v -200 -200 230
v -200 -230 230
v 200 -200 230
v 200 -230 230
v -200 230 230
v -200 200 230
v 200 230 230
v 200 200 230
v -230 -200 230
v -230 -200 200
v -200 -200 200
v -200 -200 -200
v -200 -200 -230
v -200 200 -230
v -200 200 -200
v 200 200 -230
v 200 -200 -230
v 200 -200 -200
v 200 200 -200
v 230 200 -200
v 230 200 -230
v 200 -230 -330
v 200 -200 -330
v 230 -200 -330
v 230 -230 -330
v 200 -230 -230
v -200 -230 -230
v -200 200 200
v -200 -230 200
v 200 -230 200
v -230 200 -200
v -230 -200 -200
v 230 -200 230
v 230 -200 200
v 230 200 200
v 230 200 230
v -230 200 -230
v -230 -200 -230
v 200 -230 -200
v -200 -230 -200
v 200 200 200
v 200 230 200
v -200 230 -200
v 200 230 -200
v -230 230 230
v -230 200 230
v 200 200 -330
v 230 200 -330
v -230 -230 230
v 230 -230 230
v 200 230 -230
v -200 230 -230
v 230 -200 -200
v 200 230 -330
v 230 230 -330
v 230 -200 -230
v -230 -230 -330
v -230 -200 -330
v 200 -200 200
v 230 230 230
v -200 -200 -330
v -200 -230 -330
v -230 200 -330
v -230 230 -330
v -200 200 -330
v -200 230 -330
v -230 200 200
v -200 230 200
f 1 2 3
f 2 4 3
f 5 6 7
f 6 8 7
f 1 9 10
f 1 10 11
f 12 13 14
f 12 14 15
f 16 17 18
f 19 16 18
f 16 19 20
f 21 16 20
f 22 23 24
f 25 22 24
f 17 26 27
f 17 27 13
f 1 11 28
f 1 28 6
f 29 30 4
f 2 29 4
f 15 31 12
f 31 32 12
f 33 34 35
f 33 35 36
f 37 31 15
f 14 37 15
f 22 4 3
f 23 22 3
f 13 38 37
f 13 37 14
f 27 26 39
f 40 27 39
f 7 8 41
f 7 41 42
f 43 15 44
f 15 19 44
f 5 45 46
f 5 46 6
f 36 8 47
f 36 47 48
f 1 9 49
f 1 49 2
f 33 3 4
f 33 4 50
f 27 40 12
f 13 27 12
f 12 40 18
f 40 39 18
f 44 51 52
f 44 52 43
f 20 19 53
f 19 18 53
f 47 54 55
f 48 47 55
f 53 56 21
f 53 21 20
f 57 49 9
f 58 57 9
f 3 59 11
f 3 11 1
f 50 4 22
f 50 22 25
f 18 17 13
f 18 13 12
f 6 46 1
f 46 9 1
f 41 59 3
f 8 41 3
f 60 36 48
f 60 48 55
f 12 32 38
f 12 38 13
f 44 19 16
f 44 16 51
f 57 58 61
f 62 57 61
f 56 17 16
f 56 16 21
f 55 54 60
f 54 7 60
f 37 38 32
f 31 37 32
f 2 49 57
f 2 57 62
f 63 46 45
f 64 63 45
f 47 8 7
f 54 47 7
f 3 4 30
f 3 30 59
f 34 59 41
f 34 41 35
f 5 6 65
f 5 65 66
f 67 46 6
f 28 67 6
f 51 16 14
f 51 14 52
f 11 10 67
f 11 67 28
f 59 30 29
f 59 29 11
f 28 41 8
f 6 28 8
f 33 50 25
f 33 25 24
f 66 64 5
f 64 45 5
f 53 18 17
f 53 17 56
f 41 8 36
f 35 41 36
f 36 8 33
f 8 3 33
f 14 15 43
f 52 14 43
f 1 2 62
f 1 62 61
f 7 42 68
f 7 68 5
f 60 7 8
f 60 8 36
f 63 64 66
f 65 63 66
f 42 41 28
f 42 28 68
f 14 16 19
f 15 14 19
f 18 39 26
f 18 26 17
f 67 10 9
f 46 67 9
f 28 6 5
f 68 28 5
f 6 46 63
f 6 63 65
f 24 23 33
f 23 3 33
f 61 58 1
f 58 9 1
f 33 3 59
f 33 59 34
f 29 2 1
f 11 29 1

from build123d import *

# Parameters (mm, degrees)
F3_W     = 30
F3_H     = 30
F4_DEPTH = 230
F5_W     = 30
F5_H     = 30
F6_DEPTH = 200
F7_W     = 30
F7_H     = 30
F8_DEPTH = 200
F9_DEPTH = 100


with BuildPart() as f4:
    # F3 (on Top) → F4 (new body, symmetric)
    with BuildSketch(Plane.XY):
        with Locations((-215, 215)):
            Rectangle(F3_W, F3_H)
    extrude(amount=F4_DEPTH, both=True)

    # F9#3 (add): a face of the model
    f9_3_faces = [f4.faces().sort_by_distance(p)[0] for p in [
        (-215, 215, -230),
    ]]
    extrude(f9_3_faces, amount=F9_DEPTH)


with BuildPart() as f4b:
    # F3 (on Top) → F4, piece 2 (new body, symmetric)
    with BuildSketch(Plane.XY):
        with Locations((215, 215)):
            Rectangle(F3_W, F3_H)
    extrude(amount=F4_DEPTH, both=True)

    # F9#4 (add): a face of the model
    f9_4_faces = [f4b.faces().sort_by_distance(p)[0] for p in [
        (215, 215, -230),
    ]]
    extrude(f9_4_faces, amount=F9_DEPTH)


with BuildPart() as f4c:
    # F3 (on Top) → F4, piece 3 (new body, symmetric)
    with BuildSketch(Plane.XY):
        with Locations((215, -215)):
            Rectangle(F3_W, F3_H)
    extrude(amount=F4_DEPTH, both=True)

    # F9#2 (add): a face of the model
    f9_2_faces = [f4c.faces().sort_by_distance(p)[0] for p in [
        (215, -215, -230),
    ]]
    extrude(f9_2_faces, amount=F9_DEPTH)


with BuildPart() as f4d:
    # F3 (on Top) → F4, piece 4 (new body, symmetric)
    with BuildSketch(Plane.XY):
        with Locations((-215, -215)):
            Rectangle(F3_W, F3_H)
    extrude(amount=F4_DEPTH, both=True)

    # F9 (add): a face of the model
    f9_faces = [f4d.faces().sort_by_distance(p)[0] for p in [
        (-215, -215, -230),
    ]]
    extrude(f9_faces, amount=F9_DEPTH)


with BuildPart() as f6:
    # F5 (on Front) → F6 (new body, symmetric)
    with BuildSketch(Plane.XZ):
        with Locations((-215, 215)):
            Rectangle(F5_W, F5_H)
    extrude(amount=F6_DEPTH, both=True)


with BuildPart() as f6b:
    # F5 (on Front) → F6, piece 2 (new body, symmetric)
    with BuildSketch(Plane.XZ):
        with Locations((215, 215)):
            Rectangle(F5_W, F5_H)
    extrude(amount=F6_DEPTH, both=True)


with BuildPart() as f6c:
    # F5 (on Front) → F6, piece 3 (new body, symmetric)
    with BuildSketch(Plane.XZ):
        with Locations((-215, -215)):
            Rectangle(F5_W, F5_H)
    extrude(amount=F6_DEPTH, both=True)


with BuildPart() as f6d:
    # F5 (on Front) → F6, piece 4 (new body, symmetric)
    with BuildSketch(Plane.XZ):
        with Locations((215, -215)):
            Rectangle(F5_W, F5_H)
    extrude(amount=F6_DEPTH, both=True)


with BuildPart() as f8:
    # F7 (on Right) → F8 (new body, symmetric)
    with BuildSketch(Plane.YZ):
        with Locations((-215, 215)):
            Rectangle(F7_W, F7_H)
    extrude(amount=F8_DEPTH, both=True)


with BuildPart() as f8b:
    # F7 (on Right) → F8, piece 2 (new body, symmetric)
    with BuildSketch(Plane.YZ):
        with Locations((215, 215)):
            Rectangle(F7_W, F7_H)
    extrude(amount=F8_DEPTH, both=True)


with BuildPart() as f8c:
    # F7 (on Right) → F8, piece 3 (new body, symmetric)
    with BuildSketch(Plane.YZ):
        with Locations((215, -215)):
            Rectangle(F7_W, F7_H)
    extrude(amount=F8_DEPTH, both=True)


with BuildPart() as f8d:
    # F7 (on Right) → F8, piece 4 (new body, symmetric)
    with BuildSketch(Plane.YZ):
        with Locations((-215, -215)):
            Rectangle(F7_W, F7_H)
    extrude(amount=F8_DEPTH, both=True)


solid = Compound([f4.part, f4b.part, f4c.part, f4d.part, f6.part, f6b.part, f6c.part, f6d.part, f8.part, f8b.part, f8c.part, f8d.part])
